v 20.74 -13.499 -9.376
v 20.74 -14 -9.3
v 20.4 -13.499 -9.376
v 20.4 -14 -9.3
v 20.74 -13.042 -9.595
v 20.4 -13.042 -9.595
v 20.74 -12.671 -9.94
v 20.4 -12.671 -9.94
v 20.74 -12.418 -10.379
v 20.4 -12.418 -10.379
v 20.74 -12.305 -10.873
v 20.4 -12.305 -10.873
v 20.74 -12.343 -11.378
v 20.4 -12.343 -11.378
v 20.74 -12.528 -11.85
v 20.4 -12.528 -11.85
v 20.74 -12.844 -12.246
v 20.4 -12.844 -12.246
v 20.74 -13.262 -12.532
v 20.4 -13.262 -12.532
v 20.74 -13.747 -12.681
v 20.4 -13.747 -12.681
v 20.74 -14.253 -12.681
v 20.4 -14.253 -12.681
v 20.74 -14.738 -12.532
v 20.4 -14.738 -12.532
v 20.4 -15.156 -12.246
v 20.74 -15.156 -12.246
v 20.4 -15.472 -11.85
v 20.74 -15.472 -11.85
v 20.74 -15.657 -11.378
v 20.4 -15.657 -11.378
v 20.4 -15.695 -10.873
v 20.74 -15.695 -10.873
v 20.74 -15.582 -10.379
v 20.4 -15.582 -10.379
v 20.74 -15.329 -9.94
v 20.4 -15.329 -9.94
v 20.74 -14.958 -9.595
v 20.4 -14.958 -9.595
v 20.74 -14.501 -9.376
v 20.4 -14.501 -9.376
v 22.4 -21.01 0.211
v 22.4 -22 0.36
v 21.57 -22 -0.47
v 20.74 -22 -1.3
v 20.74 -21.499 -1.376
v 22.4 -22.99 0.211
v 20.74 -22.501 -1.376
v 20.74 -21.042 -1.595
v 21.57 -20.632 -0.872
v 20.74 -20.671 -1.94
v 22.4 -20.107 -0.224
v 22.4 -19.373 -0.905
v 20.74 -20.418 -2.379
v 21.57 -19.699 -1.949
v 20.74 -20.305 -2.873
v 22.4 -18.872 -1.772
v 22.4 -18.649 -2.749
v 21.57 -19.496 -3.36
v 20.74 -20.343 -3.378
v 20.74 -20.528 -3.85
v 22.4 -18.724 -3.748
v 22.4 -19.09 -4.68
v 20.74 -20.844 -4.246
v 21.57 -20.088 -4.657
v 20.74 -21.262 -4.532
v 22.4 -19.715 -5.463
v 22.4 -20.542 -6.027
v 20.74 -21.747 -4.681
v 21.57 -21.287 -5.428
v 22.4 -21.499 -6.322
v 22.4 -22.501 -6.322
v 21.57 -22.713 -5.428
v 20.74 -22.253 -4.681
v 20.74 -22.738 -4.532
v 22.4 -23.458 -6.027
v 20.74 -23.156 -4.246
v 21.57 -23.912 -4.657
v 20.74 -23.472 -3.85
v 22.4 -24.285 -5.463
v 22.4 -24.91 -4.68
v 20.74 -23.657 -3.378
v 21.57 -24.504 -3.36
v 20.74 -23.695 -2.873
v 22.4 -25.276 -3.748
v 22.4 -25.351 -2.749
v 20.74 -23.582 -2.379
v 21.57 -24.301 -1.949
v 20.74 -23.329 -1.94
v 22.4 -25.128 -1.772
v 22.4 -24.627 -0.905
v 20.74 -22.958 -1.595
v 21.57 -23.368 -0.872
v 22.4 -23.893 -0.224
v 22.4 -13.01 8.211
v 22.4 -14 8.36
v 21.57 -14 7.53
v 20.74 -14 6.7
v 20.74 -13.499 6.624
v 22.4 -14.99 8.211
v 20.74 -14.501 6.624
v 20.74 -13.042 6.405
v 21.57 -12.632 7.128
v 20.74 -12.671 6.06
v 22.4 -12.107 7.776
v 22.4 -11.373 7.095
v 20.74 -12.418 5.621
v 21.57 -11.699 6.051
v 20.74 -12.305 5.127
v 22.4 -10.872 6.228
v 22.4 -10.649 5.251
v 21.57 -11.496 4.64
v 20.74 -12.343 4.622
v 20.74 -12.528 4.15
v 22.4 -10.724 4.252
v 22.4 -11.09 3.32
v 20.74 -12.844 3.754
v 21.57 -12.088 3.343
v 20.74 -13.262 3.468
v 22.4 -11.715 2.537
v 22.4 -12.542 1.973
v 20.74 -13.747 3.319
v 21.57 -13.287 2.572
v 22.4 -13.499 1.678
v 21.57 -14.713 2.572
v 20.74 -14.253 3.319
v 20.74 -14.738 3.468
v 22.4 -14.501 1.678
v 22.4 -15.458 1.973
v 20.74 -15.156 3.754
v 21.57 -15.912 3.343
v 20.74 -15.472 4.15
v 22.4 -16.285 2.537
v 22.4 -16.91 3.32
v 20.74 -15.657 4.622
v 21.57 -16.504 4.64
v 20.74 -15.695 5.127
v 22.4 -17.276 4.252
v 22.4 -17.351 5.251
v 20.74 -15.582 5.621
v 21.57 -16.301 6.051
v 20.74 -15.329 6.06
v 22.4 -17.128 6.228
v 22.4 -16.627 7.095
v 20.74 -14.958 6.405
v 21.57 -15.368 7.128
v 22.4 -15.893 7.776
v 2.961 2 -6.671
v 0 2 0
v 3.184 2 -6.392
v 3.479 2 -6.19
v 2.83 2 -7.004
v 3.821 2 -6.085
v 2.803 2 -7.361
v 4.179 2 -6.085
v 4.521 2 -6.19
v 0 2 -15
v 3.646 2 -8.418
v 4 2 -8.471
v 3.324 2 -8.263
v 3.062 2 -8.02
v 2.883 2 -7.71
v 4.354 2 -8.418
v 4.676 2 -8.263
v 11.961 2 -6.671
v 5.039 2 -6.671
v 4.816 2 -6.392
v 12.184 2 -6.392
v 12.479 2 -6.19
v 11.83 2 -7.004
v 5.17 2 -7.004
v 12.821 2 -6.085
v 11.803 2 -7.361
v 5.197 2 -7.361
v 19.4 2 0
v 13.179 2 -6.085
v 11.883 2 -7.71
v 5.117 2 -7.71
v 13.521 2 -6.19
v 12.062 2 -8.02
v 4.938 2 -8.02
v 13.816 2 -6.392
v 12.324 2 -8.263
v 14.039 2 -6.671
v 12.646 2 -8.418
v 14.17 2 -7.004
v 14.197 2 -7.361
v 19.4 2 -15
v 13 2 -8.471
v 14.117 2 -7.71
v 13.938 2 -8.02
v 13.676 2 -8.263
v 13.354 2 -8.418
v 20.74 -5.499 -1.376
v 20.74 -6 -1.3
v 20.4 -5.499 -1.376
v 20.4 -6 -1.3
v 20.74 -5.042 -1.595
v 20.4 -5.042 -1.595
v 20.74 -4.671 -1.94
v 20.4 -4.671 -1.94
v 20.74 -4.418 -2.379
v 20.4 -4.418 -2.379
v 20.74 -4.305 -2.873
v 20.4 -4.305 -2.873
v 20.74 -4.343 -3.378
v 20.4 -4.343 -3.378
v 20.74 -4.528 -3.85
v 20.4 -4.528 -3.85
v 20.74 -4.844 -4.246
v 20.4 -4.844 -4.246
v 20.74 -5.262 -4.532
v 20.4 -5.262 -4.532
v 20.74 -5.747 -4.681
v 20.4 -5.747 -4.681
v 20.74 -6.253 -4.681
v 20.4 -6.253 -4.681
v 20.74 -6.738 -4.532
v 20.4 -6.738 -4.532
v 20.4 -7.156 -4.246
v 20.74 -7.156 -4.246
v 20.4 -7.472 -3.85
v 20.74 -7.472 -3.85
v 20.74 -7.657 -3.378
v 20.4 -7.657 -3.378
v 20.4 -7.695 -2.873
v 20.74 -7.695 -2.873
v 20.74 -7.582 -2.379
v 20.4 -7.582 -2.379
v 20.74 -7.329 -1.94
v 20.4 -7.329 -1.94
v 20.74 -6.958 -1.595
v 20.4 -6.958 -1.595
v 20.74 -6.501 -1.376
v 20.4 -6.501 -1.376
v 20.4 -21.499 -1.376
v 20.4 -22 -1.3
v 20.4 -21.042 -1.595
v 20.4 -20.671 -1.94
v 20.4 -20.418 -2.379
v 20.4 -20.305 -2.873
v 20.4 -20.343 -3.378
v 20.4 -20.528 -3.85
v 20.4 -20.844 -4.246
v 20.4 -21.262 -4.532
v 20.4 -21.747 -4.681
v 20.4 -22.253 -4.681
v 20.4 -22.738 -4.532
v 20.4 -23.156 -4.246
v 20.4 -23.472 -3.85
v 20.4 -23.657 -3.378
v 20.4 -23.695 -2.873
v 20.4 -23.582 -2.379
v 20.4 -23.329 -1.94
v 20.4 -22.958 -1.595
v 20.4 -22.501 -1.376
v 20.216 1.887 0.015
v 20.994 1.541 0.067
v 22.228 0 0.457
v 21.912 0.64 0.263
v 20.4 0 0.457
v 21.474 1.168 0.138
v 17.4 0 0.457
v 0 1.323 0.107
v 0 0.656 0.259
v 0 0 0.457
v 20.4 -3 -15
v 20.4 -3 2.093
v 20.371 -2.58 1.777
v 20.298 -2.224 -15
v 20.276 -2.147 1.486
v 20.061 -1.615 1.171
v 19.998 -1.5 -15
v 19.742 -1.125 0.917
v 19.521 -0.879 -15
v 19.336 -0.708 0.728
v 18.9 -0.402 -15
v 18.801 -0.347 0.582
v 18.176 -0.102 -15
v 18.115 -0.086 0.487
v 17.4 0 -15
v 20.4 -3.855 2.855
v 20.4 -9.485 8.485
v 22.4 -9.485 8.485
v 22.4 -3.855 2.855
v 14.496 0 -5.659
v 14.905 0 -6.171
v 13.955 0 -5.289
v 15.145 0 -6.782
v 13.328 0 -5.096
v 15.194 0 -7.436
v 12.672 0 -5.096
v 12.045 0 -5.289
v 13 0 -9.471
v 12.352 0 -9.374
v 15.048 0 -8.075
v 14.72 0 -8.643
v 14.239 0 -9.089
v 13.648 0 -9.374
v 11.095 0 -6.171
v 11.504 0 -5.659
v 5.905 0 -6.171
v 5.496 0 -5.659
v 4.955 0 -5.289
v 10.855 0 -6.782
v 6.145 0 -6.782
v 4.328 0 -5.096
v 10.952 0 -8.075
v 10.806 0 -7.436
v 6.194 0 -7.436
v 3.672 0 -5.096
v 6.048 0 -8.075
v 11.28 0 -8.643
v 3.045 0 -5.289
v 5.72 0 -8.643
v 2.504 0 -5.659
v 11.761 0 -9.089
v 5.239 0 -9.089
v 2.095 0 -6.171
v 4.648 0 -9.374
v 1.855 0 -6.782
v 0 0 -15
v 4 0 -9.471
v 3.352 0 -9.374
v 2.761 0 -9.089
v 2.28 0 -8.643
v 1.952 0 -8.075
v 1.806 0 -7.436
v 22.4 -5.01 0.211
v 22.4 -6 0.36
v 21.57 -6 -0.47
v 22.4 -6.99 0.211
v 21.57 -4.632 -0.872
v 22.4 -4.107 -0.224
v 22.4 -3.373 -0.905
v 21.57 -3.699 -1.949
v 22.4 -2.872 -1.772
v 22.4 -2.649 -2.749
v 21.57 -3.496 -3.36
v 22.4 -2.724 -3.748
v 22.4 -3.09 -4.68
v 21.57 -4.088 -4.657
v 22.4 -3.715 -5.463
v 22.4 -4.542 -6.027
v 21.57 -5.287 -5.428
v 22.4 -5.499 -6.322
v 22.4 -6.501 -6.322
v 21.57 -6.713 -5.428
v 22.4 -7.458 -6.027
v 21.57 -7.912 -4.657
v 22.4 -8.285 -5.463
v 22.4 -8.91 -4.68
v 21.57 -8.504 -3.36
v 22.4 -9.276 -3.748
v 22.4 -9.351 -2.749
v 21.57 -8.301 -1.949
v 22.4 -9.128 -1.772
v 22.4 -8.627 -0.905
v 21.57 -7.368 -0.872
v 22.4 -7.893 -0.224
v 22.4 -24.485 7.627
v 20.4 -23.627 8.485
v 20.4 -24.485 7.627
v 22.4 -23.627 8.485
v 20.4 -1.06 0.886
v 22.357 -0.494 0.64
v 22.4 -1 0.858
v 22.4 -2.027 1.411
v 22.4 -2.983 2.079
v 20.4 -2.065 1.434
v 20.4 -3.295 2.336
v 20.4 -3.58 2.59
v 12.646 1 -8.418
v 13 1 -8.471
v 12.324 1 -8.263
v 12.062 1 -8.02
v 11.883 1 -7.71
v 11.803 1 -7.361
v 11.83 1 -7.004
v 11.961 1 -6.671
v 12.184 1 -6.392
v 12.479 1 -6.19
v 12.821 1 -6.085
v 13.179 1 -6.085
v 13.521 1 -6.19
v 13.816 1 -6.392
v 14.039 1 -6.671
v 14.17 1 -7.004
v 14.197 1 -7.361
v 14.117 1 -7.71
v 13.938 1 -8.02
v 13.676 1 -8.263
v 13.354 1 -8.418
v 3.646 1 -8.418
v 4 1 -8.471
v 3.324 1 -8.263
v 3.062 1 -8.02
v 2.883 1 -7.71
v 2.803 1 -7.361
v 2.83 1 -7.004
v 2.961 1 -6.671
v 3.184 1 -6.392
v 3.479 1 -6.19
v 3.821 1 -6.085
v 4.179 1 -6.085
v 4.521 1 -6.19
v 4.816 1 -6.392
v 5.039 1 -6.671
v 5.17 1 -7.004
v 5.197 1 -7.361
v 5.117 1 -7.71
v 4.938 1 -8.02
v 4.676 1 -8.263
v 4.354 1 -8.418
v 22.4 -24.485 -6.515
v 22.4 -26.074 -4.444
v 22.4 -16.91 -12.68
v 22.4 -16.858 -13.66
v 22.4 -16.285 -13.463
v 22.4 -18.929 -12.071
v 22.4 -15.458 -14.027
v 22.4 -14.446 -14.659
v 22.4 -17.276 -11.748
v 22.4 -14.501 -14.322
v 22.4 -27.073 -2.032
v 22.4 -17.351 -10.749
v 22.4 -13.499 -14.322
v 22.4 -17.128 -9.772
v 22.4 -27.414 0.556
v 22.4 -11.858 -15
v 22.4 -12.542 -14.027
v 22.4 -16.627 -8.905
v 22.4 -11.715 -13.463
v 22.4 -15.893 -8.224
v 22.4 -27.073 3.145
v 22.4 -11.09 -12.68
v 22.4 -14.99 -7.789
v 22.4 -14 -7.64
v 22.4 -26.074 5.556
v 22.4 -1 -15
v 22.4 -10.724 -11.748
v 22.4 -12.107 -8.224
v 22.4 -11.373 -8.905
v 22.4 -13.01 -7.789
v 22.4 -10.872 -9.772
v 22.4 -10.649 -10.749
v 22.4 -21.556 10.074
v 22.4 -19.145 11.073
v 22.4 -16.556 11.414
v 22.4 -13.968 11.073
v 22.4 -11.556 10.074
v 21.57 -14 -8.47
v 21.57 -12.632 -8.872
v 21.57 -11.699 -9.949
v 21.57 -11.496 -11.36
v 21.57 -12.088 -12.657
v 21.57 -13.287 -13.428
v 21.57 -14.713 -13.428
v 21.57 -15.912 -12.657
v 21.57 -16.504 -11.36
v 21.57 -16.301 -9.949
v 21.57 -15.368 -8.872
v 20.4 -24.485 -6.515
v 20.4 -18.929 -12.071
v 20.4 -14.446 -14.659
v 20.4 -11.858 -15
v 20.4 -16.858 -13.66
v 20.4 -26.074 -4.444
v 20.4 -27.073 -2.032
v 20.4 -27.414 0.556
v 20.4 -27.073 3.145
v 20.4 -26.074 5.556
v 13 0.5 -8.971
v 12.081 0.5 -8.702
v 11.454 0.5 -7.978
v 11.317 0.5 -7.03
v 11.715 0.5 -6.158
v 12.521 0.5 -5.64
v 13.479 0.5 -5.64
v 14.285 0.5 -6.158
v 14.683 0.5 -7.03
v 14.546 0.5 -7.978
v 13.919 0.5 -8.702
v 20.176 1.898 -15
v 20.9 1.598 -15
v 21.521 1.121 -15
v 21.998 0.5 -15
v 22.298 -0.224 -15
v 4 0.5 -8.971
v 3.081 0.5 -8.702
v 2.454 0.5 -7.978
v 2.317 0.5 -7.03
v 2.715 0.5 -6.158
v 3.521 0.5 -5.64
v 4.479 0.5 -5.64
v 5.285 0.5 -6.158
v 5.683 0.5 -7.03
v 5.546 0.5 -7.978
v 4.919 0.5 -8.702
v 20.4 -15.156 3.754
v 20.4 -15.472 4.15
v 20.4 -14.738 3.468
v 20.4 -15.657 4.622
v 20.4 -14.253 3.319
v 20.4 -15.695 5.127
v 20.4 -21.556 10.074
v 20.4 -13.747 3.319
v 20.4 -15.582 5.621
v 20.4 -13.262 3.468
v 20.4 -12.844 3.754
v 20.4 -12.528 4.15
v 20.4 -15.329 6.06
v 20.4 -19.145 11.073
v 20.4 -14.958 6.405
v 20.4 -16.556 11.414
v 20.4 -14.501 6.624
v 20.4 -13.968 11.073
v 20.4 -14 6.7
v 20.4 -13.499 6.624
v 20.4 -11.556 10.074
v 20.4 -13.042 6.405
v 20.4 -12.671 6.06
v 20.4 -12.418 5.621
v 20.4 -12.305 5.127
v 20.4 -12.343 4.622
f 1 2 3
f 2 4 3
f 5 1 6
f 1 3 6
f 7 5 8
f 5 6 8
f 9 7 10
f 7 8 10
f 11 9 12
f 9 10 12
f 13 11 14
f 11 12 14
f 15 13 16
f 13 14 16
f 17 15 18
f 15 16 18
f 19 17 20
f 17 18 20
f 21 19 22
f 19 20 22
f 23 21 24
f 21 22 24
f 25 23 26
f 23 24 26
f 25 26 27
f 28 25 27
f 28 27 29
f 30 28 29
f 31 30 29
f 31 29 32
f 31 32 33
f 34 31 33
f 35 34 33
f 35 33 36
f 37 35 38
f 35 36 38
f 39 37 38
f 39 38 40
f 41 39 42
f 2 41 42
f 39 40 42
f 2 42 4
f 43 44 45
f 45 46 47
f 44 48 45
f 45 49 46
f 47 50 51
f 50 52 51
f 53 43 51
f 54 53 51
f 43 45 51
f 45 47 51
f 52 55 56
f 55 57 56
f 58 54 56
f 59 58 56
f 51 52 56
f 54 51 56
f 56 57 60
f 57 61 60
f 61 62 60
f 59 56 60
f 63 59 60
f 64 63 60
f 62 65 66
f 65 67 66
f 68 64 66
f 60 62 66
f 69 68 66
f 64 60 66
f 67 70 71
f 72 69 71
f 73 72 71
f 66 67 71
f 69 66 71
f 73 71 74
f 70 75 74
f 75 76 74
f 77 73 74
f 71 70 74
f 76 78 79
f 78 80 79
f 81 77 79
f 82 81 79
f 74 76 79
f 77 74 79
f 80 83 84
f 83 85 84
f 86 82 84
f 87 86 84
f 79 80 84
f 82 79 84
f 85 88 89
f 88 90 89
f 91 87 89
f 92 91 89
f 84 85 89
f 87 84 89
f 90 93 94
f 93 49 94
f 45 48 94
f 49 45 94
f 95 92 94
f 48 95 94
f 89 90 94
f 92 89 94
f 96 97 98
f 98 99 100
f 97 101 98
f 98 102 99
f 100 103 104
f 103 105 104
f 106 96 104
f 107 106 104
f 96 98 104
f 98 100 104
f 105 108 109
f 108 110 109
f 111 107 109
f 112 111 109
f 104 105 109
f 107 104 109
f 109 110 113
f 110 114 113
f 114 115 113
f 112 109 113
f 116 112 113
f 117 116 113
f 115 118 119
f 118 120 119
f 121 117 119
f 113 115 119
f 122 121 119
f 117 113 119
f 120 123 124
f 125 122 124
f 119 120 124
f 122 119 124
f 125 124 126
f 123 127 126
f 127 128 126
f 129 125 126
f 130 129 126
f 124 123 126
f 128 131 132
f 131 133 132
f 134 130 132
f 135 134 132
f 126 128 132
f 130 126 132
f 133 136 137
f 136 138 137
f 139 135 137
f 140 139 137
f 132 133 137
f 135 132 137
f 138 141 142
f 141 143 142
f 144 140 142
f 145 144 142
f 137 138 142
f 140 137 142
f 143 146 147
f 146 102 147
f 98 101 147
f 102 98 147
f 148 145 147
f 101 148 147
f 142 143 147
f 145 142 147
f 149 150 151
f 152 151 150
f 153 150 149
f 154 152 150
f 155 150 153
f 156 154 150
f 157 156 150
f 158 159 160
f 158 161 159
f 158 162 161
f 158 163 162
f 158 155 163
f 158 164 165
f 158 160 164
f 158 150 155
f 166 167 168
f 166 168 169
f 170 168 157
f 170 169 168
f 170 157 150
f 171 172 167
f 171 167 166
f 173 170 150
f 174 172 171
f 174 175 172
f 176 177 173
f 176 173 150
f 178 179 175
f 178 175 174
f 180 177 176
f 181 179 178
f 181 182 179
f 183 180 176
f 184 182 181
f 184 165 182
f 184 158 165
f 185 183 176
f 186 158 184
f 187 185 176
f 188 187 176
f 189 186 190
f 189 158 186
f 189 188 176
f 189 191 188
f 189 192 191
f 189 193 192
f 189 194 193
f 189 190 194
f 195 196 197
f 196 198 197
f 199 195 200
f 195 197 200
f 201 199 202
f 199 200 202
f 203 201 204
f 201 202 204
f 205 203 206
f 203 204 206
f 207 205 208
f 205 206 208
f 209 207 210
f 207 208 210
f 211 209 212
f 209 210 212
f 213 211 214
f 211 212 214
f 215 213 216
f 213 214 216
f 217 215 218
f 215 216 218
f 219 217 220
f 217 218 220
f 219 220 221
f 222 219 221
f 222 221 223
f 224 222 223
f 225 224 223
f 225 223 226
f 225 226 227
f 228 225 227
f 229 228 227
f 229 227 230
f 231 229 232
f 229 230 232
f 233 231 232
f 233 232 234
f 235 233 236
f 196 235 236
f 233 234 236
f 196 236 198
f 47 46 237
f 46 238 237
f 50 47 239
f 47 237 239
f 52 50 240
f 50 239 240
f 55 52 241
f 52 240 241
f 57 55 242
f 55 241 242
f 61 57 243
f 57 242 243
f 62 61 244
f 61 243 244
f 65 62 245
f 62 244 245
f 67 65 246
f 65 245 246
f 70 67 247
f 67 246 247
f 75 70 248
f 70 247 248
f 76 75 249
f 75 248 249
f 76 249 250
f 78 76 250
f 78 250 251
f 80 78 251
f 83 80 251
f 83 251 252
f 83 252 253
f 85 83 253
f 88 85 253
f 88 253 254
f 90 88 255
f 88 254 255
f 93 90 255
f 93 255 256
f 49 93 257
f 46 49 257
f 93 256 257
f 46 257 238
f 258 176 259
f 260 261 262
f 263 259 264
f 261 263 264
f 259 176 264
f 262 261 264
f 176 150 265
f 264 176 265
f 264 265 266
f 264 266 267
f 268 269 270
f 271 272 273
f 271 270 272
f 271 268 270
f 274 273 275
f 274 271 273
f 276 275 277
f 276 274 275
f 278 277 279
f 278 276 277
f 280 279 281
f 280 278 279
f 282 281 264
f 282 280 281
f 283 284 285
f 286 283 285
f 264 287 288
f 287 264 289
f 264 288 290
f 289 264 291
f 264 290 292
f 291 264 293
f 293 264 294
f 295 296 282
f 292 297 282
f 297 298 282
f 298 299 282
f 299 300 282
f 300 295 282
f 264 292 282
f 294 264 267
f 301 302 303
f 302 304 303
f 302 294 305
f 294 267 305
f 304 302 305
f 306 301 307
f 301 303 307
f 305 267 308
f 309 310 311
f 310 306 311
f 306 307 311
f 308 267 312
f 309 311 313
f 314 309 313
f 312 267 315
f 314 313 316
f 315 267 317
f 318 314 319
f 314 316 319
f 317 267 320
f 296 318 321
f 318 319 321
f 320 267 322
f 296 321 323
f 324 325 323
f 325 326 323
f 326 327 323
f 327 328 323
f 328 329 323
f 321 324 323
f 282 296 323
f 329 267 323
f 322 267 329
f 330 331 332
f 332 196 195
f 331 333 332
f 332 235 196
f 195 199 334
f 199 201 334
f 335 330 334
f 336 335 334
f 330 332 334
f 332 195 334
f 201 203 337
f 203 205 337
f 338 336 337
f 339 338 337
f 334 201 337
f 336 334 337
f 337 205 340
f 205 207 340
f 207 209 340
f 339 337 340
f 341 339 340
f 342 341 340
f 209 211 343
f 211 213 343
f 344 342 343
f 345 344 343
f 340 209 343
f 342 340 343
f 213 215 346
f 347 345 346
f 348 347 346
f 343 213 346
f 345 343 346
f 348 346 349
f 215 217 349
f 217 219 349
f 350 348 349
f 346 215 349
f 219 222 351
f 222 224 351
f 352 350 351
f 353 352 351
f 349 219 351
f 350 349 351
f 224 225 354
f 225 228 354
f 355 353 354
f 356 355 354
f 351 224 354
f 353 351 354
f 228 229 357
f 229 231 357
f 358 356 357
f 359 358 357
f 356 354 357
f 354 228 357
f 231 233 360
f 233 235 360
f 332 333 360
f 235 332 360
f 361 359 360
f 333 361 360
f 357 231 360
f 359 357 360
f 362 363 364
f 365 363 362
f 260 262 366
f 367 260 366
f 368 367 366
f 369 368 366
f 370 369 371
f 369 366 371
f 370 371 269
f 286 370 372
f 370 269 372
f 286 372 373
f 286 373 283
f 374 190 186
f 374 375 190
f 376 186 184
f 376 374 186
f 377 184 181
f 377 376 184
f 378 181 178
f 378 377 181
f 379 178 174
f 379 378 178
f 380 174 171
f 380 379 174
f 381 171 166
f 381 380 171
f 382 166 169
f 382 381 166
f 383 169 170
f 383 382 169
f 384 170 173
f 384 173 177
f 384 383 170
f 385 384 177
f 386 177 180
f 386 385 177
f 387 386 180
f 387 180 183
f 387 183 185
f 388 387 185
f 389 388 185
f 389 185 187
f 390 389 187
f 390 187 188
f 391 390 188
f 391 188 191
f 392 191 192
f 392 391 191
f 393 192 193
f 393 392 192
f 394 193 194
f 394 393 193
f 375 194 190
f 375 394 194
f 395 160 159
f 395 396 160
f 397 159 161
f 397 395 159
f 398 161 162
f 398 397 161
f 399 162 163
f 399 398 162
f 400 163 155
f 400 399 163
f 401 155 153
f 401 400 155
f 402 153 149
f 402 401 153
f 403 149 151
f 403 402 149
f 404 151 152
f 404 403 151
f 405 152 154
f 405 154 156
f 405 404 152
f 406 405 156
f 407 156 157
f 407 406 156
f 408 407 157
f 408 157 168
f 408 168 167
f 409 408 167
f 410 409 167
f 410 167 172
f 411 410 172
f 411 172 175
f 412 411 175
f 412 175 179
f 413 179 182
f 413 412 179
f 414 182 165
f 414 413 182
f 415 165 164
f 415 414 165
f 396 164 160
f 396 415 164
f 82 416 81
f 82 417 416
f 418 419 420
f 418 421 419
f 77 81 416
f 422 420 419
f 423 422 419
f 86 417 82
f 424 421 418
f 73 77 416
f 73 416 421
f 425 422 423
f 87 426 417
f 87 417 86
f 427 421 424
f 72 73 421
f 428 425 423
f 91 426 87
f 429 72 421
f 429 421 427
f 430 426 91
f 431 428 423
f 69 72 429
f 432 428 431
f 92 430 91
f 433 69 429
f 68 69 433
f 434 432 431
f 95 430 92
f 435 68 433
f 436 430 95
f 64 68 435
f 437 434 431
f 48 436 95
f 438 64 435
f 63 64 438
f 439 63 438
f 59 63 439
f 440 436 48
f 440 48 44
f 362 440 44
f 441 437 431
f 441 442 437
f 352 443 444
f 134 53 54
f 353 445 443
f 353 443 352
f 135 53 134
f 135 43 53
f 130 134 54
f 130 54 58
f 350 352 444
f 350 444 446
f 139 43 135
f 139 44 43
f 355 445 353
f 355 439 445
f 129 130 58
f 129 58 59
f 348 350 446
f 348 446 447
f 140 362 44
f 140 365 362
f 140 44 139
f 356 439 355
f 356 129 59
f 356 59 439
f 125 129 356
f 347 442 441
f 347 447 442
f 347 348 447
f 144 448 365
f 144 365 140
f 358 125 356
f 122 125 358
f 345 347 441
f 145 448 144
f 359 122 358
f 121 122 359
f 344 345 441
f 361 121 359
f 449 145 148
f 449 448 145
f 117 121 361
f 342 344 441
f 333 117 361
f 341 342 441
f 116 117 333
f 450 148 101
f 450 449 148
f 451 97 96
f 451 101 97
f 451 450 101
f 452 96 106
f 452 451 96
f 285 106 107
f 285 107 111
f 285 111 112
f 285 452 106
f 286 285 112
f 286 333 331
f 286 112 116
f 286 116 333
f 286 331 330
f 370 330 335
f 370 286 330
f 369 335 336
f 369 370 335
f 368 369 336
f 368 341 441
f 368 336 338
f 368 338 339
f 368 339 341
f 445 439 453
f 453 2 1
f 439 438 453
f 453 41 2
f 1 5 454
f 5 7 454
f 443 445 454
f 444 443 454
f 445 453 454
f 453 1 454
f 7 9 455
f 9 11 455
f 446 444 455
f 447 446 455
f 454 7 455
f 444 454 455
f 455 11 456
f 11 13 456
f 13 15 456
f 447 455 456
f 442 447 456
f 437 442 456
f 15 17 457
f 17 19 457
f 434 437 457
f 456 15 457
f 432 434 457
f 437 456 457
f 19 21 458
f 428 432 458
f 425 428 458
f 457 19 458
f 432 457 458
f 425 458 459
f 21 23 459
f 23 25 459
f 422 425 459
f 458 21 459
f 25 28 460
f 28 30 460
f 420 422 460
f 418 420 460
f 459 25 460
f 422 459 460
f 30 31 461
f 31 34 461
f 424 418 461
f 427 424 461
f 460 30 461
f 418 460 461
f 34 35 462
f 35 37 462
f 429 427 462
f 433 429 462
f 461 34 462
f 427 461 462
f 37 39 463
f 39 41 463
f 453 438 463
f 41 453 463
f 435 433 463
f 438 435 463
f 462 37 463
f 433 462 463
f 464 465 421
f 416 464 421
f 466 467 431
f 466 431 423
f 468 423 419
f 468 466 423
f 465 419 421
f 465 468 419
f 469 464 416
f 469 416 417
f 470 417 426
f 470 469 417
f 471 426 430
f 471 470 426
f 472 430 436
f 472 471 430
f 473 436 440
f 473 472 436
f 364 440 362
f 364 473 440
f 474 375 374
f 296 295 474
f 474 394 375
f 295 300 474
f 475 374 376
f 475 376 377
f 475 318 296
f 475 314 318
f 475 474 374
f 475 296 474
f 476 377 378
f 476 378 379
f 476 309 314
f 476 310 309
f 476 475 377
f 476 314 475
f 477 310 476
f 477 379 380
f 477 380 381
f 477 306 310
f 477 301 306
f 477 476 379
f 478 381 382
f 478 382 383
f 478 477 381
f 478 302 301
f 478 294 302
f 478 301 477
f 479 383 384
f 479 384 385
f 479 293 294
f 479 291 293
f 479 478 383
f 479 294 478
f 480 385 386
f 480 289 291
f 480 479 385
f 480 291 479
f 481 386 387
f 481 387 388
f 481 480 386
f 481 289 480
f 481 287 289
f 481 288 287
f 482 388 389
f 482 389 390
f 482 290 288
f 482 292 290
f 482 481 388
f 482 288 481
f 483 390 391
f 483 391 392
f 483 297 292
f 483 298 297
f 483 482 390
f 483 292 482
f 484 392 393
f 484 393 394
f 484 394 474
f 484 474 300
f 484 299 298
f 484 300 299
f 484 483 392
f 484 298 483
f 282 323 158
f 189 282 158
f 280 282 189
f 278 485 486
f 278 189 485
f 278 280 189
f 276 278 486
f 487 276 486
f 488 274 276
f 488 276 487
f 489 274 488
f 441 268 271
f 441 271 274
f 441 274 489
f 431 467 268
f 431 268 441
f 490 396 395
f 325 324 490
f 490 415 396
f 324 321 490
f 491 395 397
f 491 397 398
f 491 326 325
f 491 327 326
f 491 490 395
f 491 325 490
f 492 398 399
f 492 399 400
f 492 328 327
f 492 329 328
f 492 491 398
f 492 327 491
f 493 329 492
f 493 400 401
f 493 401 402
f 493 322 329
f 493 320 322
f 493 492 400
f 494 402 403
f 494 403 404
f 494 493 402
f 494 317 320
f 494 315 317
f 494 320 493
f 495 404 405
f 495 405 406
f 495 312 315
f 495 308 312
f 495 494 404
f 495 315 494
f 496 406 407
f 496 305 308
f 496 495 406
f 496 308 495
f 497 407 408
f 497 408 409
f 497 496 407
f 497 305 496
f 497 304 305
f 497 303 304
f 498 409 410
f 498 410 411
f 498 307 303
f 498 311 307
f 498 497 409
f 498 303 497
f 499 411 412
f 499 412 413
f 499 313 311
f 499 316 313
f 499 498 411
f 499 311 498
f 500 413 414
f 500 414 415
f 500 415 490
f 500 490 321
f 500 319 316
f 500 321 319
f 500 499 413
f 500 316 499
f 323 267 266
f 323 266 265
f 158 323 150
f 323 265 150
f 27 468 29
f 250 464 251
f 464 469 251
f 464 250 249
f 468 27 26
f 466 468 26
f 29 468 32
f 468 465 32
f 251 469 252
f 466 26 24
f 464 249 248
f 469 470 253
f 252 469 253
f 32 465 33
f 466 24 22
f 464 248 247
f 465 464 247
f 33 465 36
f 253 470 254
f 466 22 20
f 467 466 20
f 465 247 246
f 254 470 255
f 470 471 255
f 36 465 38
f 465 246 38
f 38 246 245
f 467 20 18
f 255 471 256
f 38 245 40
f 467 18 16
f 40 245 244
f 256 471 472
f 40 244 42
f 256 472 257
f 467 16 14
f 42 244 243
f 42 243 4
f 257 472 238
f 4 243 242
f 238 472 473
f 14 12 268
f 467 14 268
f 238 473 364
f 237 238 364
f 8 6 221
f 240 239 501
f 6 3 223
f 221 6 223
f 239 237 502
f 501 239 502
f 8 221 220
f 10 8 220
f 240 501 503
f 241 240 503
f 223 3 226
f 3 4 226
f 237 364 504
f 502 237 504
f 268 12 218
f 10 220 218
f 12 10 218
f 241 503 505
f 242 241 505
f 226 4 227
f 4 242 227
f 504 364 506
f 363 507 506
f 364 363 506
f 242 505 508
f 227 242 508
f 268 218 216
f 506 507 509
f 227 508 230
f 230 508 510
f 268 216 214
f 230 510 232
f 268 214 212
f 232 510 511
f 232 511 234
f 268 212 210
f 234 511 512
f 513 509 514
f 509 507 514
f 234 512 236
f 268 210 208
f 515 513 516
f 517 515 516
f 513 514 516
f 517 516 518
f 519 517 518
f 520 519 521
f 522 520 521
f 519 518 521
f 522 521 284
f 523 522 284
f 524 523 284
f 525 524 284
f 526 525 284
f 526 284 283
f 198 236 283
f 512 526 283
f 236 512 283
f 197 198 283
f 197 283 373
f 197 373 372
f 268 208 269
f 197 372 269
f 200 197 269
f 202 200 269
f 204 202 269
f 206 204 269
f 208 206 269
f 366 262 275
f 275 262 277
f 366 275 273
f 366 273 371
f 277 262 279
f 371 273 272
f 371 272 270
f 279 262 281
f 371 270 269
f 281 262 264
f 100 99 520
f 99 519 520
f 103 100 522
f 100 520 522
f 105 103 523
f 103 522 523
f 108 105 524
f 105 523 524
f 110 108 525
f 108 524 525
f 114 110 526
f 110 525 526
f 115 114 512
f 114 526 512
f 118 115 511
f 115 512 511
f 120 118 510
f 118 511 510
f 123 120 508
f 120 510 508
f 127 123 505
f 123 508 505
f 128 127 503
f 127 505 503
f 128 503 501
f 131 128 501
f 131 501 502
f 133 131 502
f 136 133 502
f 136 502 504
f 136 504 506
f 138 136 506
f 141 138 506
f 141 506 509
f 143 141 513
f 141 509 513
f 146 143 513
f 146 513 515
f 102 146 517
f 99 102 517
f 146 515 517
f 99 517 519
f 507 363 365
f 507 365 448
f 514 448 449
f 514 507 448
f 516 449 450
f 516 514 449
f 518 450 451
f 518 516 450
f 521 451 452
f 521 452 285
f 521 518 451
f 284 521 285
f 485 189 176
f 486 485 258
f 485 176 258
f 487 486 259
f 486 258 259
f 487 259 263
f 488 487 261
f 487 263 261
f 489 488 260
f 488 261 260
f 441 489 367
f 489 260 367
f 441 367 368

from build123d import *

# Parameters (mm, degrees)
ESBO_O1_W                                    = 22.4
ESBO_O1_H                                    = 15
RESSALTO_EXTRUS_O1_DEPTH                     = 2
ESBO_O9_W                                    = 2
ESBO_O9_H                                    = 15
RESSALTO_EXTRUS_O2_DEPTH                     = 1
INCLINA_O2_ANGLE                             = 45
ESBO_O11_W                                   = 2
ESBO_O11_H                                   = 21.213203436
RESSALTO_EXTRUS_O4_DEPTH                     = 22
FILETE1_START                                = 20.4
FILETE1_DEPTH                                = 2
FILETE1_2_DEPTH                              = 22.4
FILETE1_3_DEPTH                              = 2
ESCAREADO_PARA_SFHCS_M31_D                   = 3.4
ESCAREADO_PARA_SFHCS_M31_DEPTH               = 7.5
ESCAREADO_PARA_SFHCS_M31_CSINK_D             = 6.72
ESCAREADO_PARA_SFHCS_M31_CSINK_ANGLE         = 90
ESCAREADO_PARA_SFHCS_M31_TIP                 = 1.021463052
FILETE2_R                                    = 3
ESCAREADO_PARA_PARAFUSO_COM_CABE_A_E_2_COUNT = 2
ESCAREADO_PARA_PARAFUSO_COM_CABE_A_E_2_PITCH = 9


with BuildPart() as part:
    # Esboço1 → Ressalto-extrusão1 (new body)
    with BuildSketch(Plane(origin=(0, 0, 0), x_dir=(1, 0, 0), z_dir=(0, 1, 0))):
        with Locations((11.2, 7.5)):
            Rectangle(ESBO_O1_W, ESBO_O1_H)
    extrude(amount=RESSALTO_EXTRUS_O1_DEPTH)

    # Esboço9 → Ressalto-extrusão2 (add)
    with BuildSketch(Plane.XZ):
        with Locations((21.4, -7.5)):
            Rectangle(ESBO_O9_W, ESBO_O9_H)
    extrude(amount=RESSALTO_EXTRUS_O2_DEPTH)

    # Inclinação2
    inclina_o2_faces = [part.faces().sort_by_distance(p)[0] for p in [
        (21.4, -1, -7.5),
    ]]
    draft(inclina_o2_faces, Plane(origin=(0, 2, 0), x_dir=(1, 0, 0), z_dir=(0, 0, 1)), INCLINA_O2_ANGLE)

    # Esboço11 → Ressalto-extrusão4 (add)
    with BuildSketch(Plane(origin=(0, -0.5, 0.5), x_dir=(1, 0, 0), z_dir=(0, -0.7071067811865462, 0.7071067811865488))):
        with Locations((21.4, -11.313708499)):
            Rectangle(ESBO_O11_W, ESBO_O11_H)
    extrude(amount=RESSALTO_EXTRUS_O4_DEPTH)

    # Filete1: read off the stored shape, not the designer's step
    # Filete1 outline → Filete1 (cut)
    with BuildSketch(Plane.YZ.offset(FILETE1_START)):
        with BuildLine():
            ThreePointArc((-23.627416998, 8.485281374), (-16.556349186, 11.414213562), (-9.485281374, 8.485281374))
            Line((-9.485281374, 8.485281374), (-16.556349186, 15.556349186))
            Line((-16.556349186, 15.556349186), (-23.627416998, 8.485281374))
        make_face()
        with BuildLine():
            Line((-16, -15), (-11.857864376, -15))
            ThreePointArc((-11.857864376, -15), (-15.6846987, -14.238795325), (-18.928932188, -12.071067812))
            Line((-18.928932188, -12.071067812), (-16, -15))
        make_face()
        with BuildLine():
            ThreePointArc((-24.485281374, -6.514718626), (-27.414213562, 0.556349186), (-24.485281374, 7.627416998))
            Line((-24.485281374, 7.627416998), (-31.556349186, 0.556349186))
            Line((-31.556349186, 0.556349186), (-24.485281374, -6.514718626))
        make_face()
    extrude(amount=FILETE1_DEPTH, mode=Mode.SUBTRACT)

    # Filete1 2 outline → Filete1 2 (add)
    with BuildSketch(Plane.YZ):
        with BuildLine():
            Line((0, 0), (2, 0))
            ThreePointArc((2, 0), (0.988246282, 0.177135355), (0, 0.457120724))
            Line((0, 0.457120724), (0, 0))
        make_face()
    extrude(amount=FILETE1_2_DEPTH)

    # Filete1 3 outline → Filete1 3 (add)
    with BuildSketch(Plane.YZ.offset(FILETE1_START)):
        with BuildLine():
            Line((0, 0), (0, 0.457120724))
            ThreePointArc((0, 0.457120724), (-2.065182242, 1.434278965), (-3.854676043, 2.854676043))
            Line((-3.854676043, 2.854676043), (-1, 0))
            Line((-1, 0), (0, 0))
        make_face()
    extrude(amount=FILETE1_3_DEPTH)

    # Escareado para SFHCS M31
    with Locations(Plane(origin=(22.4, 0, 0), x_dir=(0, 0, -1), z_dir=(1, 0, 0))):
        with Locations((3, -6), (11, -14), (3, -22), (-5, -14)):
            CounterSinkHole(ESCAREADO_PARA_SFHCS_M31_D / 2, ESCAREADO_PARA_SFHCS_M31_CSINK_D / 2, depth=ESCAREADO_PARA_SFHCS_M31_DEPTH, counter_sink_angle=ESCAREADO_PARA_SFHCS_M31_CSINK_ANGLE)
            with Locations((0, 0, -(ESCAREADO_PARA_SFHCS_M31_DEPTH + ESCAREADO_PARA_SFHCS_M31_TIP / 2))):  # 118° drill point
                Cone(0, ESCAREADO_PARA_SFHCS_M31_D / 2, ESCAREADO_PARA_SFHCS_M31_TIP, mode=Mode.SUBTRACT)

    # Filete2
    # the kernel refuses this fillet: 3 mm, written as the material it adds along each edge
    with BuildSketch(Plane(origin=(20.4, 0, -15), x_dir=(-1, 0, 0), z_dir=(0, 0, 1))) as filete2_piece_1_section:
        with BuildLine():
            CenterArc((FILETE2_R, FILETE2_R), FILETE2_R, 180, 90)
            Line((0, FILETE2_R), (0, 0))
            Line((0, 0), (FILETE2_R, 0))
        make_face()
    filete2_piece_1 = extrude(amount=22.957120724, mode=Mode.PRIVATE)
    filete2_piece_1 = filete2_piece_1 - Plane(origin=(20.4, 3.216391795, 9.925743967), x_dir=(0, -0.12163917811992071, -0.9925743852962912), z_dir=(-1, 0, 0)) * Cylinder(10.000000115, 58, mode=Mode.PRIVATE)
    add(filete2_piece_1)
    # the kernel refuses this fillet: 3 mm, written as the material it takes off along each edge
    with BuildSketch(Plane(origin=(22.4, 2, 7.5), x_dir=(-1, 0, 0), z_dir=(0, 0, -1))) as filete2_2_piece_1:
        with BuildLine():
            CenterArc((FILETE2_R, -FILETE2_R), FILETE2_R, 90, 90)
            Line((0, -FILETE2_R), (0, 0))
            Line((0, 0), (FILETE2_R, 0))
        make_face()
    extrude(amount=30, mode=Mode.SUBTRACT)

    # Esboço16 → Escareado para parafuso com cabeça escareada elevada de M21 (revolve, cut)
    with BuildSketch(Plane(origin=(4, 0, -7.271439638), x_dir=(0, 0, -1), z_dir=(1, 0, 0))):
        Polygon((0, 0), (0, 2), (1.2, 2), (1.2, 1), (2.2, 0), align=None)
    escareado_para_parafuso_com_cabe_a_escar = revolve(axis=Axis((4, -6.35, -7.271439638), (0, 1, 0)), mode=Mode.SUBTRACT)

    # Escareado para parafuso com cabe_a e 2: Escareado para parafuso com cabeça escareada elevada de M21 ×2
    with Locations(*[(i * ESCAREADO_PARA_PARAFUSO_COM_CABE_A_E_2_PITCH, 0, 0) for i in range(1, ESCAREADO_PARA_PARAFUSO_COM_CABE_A_E_2_COUNT)]):
        add(escareado_para_parafuso_com_cabe_a_escar, mode=Mode.SUBTRACT)


solid = part.part
